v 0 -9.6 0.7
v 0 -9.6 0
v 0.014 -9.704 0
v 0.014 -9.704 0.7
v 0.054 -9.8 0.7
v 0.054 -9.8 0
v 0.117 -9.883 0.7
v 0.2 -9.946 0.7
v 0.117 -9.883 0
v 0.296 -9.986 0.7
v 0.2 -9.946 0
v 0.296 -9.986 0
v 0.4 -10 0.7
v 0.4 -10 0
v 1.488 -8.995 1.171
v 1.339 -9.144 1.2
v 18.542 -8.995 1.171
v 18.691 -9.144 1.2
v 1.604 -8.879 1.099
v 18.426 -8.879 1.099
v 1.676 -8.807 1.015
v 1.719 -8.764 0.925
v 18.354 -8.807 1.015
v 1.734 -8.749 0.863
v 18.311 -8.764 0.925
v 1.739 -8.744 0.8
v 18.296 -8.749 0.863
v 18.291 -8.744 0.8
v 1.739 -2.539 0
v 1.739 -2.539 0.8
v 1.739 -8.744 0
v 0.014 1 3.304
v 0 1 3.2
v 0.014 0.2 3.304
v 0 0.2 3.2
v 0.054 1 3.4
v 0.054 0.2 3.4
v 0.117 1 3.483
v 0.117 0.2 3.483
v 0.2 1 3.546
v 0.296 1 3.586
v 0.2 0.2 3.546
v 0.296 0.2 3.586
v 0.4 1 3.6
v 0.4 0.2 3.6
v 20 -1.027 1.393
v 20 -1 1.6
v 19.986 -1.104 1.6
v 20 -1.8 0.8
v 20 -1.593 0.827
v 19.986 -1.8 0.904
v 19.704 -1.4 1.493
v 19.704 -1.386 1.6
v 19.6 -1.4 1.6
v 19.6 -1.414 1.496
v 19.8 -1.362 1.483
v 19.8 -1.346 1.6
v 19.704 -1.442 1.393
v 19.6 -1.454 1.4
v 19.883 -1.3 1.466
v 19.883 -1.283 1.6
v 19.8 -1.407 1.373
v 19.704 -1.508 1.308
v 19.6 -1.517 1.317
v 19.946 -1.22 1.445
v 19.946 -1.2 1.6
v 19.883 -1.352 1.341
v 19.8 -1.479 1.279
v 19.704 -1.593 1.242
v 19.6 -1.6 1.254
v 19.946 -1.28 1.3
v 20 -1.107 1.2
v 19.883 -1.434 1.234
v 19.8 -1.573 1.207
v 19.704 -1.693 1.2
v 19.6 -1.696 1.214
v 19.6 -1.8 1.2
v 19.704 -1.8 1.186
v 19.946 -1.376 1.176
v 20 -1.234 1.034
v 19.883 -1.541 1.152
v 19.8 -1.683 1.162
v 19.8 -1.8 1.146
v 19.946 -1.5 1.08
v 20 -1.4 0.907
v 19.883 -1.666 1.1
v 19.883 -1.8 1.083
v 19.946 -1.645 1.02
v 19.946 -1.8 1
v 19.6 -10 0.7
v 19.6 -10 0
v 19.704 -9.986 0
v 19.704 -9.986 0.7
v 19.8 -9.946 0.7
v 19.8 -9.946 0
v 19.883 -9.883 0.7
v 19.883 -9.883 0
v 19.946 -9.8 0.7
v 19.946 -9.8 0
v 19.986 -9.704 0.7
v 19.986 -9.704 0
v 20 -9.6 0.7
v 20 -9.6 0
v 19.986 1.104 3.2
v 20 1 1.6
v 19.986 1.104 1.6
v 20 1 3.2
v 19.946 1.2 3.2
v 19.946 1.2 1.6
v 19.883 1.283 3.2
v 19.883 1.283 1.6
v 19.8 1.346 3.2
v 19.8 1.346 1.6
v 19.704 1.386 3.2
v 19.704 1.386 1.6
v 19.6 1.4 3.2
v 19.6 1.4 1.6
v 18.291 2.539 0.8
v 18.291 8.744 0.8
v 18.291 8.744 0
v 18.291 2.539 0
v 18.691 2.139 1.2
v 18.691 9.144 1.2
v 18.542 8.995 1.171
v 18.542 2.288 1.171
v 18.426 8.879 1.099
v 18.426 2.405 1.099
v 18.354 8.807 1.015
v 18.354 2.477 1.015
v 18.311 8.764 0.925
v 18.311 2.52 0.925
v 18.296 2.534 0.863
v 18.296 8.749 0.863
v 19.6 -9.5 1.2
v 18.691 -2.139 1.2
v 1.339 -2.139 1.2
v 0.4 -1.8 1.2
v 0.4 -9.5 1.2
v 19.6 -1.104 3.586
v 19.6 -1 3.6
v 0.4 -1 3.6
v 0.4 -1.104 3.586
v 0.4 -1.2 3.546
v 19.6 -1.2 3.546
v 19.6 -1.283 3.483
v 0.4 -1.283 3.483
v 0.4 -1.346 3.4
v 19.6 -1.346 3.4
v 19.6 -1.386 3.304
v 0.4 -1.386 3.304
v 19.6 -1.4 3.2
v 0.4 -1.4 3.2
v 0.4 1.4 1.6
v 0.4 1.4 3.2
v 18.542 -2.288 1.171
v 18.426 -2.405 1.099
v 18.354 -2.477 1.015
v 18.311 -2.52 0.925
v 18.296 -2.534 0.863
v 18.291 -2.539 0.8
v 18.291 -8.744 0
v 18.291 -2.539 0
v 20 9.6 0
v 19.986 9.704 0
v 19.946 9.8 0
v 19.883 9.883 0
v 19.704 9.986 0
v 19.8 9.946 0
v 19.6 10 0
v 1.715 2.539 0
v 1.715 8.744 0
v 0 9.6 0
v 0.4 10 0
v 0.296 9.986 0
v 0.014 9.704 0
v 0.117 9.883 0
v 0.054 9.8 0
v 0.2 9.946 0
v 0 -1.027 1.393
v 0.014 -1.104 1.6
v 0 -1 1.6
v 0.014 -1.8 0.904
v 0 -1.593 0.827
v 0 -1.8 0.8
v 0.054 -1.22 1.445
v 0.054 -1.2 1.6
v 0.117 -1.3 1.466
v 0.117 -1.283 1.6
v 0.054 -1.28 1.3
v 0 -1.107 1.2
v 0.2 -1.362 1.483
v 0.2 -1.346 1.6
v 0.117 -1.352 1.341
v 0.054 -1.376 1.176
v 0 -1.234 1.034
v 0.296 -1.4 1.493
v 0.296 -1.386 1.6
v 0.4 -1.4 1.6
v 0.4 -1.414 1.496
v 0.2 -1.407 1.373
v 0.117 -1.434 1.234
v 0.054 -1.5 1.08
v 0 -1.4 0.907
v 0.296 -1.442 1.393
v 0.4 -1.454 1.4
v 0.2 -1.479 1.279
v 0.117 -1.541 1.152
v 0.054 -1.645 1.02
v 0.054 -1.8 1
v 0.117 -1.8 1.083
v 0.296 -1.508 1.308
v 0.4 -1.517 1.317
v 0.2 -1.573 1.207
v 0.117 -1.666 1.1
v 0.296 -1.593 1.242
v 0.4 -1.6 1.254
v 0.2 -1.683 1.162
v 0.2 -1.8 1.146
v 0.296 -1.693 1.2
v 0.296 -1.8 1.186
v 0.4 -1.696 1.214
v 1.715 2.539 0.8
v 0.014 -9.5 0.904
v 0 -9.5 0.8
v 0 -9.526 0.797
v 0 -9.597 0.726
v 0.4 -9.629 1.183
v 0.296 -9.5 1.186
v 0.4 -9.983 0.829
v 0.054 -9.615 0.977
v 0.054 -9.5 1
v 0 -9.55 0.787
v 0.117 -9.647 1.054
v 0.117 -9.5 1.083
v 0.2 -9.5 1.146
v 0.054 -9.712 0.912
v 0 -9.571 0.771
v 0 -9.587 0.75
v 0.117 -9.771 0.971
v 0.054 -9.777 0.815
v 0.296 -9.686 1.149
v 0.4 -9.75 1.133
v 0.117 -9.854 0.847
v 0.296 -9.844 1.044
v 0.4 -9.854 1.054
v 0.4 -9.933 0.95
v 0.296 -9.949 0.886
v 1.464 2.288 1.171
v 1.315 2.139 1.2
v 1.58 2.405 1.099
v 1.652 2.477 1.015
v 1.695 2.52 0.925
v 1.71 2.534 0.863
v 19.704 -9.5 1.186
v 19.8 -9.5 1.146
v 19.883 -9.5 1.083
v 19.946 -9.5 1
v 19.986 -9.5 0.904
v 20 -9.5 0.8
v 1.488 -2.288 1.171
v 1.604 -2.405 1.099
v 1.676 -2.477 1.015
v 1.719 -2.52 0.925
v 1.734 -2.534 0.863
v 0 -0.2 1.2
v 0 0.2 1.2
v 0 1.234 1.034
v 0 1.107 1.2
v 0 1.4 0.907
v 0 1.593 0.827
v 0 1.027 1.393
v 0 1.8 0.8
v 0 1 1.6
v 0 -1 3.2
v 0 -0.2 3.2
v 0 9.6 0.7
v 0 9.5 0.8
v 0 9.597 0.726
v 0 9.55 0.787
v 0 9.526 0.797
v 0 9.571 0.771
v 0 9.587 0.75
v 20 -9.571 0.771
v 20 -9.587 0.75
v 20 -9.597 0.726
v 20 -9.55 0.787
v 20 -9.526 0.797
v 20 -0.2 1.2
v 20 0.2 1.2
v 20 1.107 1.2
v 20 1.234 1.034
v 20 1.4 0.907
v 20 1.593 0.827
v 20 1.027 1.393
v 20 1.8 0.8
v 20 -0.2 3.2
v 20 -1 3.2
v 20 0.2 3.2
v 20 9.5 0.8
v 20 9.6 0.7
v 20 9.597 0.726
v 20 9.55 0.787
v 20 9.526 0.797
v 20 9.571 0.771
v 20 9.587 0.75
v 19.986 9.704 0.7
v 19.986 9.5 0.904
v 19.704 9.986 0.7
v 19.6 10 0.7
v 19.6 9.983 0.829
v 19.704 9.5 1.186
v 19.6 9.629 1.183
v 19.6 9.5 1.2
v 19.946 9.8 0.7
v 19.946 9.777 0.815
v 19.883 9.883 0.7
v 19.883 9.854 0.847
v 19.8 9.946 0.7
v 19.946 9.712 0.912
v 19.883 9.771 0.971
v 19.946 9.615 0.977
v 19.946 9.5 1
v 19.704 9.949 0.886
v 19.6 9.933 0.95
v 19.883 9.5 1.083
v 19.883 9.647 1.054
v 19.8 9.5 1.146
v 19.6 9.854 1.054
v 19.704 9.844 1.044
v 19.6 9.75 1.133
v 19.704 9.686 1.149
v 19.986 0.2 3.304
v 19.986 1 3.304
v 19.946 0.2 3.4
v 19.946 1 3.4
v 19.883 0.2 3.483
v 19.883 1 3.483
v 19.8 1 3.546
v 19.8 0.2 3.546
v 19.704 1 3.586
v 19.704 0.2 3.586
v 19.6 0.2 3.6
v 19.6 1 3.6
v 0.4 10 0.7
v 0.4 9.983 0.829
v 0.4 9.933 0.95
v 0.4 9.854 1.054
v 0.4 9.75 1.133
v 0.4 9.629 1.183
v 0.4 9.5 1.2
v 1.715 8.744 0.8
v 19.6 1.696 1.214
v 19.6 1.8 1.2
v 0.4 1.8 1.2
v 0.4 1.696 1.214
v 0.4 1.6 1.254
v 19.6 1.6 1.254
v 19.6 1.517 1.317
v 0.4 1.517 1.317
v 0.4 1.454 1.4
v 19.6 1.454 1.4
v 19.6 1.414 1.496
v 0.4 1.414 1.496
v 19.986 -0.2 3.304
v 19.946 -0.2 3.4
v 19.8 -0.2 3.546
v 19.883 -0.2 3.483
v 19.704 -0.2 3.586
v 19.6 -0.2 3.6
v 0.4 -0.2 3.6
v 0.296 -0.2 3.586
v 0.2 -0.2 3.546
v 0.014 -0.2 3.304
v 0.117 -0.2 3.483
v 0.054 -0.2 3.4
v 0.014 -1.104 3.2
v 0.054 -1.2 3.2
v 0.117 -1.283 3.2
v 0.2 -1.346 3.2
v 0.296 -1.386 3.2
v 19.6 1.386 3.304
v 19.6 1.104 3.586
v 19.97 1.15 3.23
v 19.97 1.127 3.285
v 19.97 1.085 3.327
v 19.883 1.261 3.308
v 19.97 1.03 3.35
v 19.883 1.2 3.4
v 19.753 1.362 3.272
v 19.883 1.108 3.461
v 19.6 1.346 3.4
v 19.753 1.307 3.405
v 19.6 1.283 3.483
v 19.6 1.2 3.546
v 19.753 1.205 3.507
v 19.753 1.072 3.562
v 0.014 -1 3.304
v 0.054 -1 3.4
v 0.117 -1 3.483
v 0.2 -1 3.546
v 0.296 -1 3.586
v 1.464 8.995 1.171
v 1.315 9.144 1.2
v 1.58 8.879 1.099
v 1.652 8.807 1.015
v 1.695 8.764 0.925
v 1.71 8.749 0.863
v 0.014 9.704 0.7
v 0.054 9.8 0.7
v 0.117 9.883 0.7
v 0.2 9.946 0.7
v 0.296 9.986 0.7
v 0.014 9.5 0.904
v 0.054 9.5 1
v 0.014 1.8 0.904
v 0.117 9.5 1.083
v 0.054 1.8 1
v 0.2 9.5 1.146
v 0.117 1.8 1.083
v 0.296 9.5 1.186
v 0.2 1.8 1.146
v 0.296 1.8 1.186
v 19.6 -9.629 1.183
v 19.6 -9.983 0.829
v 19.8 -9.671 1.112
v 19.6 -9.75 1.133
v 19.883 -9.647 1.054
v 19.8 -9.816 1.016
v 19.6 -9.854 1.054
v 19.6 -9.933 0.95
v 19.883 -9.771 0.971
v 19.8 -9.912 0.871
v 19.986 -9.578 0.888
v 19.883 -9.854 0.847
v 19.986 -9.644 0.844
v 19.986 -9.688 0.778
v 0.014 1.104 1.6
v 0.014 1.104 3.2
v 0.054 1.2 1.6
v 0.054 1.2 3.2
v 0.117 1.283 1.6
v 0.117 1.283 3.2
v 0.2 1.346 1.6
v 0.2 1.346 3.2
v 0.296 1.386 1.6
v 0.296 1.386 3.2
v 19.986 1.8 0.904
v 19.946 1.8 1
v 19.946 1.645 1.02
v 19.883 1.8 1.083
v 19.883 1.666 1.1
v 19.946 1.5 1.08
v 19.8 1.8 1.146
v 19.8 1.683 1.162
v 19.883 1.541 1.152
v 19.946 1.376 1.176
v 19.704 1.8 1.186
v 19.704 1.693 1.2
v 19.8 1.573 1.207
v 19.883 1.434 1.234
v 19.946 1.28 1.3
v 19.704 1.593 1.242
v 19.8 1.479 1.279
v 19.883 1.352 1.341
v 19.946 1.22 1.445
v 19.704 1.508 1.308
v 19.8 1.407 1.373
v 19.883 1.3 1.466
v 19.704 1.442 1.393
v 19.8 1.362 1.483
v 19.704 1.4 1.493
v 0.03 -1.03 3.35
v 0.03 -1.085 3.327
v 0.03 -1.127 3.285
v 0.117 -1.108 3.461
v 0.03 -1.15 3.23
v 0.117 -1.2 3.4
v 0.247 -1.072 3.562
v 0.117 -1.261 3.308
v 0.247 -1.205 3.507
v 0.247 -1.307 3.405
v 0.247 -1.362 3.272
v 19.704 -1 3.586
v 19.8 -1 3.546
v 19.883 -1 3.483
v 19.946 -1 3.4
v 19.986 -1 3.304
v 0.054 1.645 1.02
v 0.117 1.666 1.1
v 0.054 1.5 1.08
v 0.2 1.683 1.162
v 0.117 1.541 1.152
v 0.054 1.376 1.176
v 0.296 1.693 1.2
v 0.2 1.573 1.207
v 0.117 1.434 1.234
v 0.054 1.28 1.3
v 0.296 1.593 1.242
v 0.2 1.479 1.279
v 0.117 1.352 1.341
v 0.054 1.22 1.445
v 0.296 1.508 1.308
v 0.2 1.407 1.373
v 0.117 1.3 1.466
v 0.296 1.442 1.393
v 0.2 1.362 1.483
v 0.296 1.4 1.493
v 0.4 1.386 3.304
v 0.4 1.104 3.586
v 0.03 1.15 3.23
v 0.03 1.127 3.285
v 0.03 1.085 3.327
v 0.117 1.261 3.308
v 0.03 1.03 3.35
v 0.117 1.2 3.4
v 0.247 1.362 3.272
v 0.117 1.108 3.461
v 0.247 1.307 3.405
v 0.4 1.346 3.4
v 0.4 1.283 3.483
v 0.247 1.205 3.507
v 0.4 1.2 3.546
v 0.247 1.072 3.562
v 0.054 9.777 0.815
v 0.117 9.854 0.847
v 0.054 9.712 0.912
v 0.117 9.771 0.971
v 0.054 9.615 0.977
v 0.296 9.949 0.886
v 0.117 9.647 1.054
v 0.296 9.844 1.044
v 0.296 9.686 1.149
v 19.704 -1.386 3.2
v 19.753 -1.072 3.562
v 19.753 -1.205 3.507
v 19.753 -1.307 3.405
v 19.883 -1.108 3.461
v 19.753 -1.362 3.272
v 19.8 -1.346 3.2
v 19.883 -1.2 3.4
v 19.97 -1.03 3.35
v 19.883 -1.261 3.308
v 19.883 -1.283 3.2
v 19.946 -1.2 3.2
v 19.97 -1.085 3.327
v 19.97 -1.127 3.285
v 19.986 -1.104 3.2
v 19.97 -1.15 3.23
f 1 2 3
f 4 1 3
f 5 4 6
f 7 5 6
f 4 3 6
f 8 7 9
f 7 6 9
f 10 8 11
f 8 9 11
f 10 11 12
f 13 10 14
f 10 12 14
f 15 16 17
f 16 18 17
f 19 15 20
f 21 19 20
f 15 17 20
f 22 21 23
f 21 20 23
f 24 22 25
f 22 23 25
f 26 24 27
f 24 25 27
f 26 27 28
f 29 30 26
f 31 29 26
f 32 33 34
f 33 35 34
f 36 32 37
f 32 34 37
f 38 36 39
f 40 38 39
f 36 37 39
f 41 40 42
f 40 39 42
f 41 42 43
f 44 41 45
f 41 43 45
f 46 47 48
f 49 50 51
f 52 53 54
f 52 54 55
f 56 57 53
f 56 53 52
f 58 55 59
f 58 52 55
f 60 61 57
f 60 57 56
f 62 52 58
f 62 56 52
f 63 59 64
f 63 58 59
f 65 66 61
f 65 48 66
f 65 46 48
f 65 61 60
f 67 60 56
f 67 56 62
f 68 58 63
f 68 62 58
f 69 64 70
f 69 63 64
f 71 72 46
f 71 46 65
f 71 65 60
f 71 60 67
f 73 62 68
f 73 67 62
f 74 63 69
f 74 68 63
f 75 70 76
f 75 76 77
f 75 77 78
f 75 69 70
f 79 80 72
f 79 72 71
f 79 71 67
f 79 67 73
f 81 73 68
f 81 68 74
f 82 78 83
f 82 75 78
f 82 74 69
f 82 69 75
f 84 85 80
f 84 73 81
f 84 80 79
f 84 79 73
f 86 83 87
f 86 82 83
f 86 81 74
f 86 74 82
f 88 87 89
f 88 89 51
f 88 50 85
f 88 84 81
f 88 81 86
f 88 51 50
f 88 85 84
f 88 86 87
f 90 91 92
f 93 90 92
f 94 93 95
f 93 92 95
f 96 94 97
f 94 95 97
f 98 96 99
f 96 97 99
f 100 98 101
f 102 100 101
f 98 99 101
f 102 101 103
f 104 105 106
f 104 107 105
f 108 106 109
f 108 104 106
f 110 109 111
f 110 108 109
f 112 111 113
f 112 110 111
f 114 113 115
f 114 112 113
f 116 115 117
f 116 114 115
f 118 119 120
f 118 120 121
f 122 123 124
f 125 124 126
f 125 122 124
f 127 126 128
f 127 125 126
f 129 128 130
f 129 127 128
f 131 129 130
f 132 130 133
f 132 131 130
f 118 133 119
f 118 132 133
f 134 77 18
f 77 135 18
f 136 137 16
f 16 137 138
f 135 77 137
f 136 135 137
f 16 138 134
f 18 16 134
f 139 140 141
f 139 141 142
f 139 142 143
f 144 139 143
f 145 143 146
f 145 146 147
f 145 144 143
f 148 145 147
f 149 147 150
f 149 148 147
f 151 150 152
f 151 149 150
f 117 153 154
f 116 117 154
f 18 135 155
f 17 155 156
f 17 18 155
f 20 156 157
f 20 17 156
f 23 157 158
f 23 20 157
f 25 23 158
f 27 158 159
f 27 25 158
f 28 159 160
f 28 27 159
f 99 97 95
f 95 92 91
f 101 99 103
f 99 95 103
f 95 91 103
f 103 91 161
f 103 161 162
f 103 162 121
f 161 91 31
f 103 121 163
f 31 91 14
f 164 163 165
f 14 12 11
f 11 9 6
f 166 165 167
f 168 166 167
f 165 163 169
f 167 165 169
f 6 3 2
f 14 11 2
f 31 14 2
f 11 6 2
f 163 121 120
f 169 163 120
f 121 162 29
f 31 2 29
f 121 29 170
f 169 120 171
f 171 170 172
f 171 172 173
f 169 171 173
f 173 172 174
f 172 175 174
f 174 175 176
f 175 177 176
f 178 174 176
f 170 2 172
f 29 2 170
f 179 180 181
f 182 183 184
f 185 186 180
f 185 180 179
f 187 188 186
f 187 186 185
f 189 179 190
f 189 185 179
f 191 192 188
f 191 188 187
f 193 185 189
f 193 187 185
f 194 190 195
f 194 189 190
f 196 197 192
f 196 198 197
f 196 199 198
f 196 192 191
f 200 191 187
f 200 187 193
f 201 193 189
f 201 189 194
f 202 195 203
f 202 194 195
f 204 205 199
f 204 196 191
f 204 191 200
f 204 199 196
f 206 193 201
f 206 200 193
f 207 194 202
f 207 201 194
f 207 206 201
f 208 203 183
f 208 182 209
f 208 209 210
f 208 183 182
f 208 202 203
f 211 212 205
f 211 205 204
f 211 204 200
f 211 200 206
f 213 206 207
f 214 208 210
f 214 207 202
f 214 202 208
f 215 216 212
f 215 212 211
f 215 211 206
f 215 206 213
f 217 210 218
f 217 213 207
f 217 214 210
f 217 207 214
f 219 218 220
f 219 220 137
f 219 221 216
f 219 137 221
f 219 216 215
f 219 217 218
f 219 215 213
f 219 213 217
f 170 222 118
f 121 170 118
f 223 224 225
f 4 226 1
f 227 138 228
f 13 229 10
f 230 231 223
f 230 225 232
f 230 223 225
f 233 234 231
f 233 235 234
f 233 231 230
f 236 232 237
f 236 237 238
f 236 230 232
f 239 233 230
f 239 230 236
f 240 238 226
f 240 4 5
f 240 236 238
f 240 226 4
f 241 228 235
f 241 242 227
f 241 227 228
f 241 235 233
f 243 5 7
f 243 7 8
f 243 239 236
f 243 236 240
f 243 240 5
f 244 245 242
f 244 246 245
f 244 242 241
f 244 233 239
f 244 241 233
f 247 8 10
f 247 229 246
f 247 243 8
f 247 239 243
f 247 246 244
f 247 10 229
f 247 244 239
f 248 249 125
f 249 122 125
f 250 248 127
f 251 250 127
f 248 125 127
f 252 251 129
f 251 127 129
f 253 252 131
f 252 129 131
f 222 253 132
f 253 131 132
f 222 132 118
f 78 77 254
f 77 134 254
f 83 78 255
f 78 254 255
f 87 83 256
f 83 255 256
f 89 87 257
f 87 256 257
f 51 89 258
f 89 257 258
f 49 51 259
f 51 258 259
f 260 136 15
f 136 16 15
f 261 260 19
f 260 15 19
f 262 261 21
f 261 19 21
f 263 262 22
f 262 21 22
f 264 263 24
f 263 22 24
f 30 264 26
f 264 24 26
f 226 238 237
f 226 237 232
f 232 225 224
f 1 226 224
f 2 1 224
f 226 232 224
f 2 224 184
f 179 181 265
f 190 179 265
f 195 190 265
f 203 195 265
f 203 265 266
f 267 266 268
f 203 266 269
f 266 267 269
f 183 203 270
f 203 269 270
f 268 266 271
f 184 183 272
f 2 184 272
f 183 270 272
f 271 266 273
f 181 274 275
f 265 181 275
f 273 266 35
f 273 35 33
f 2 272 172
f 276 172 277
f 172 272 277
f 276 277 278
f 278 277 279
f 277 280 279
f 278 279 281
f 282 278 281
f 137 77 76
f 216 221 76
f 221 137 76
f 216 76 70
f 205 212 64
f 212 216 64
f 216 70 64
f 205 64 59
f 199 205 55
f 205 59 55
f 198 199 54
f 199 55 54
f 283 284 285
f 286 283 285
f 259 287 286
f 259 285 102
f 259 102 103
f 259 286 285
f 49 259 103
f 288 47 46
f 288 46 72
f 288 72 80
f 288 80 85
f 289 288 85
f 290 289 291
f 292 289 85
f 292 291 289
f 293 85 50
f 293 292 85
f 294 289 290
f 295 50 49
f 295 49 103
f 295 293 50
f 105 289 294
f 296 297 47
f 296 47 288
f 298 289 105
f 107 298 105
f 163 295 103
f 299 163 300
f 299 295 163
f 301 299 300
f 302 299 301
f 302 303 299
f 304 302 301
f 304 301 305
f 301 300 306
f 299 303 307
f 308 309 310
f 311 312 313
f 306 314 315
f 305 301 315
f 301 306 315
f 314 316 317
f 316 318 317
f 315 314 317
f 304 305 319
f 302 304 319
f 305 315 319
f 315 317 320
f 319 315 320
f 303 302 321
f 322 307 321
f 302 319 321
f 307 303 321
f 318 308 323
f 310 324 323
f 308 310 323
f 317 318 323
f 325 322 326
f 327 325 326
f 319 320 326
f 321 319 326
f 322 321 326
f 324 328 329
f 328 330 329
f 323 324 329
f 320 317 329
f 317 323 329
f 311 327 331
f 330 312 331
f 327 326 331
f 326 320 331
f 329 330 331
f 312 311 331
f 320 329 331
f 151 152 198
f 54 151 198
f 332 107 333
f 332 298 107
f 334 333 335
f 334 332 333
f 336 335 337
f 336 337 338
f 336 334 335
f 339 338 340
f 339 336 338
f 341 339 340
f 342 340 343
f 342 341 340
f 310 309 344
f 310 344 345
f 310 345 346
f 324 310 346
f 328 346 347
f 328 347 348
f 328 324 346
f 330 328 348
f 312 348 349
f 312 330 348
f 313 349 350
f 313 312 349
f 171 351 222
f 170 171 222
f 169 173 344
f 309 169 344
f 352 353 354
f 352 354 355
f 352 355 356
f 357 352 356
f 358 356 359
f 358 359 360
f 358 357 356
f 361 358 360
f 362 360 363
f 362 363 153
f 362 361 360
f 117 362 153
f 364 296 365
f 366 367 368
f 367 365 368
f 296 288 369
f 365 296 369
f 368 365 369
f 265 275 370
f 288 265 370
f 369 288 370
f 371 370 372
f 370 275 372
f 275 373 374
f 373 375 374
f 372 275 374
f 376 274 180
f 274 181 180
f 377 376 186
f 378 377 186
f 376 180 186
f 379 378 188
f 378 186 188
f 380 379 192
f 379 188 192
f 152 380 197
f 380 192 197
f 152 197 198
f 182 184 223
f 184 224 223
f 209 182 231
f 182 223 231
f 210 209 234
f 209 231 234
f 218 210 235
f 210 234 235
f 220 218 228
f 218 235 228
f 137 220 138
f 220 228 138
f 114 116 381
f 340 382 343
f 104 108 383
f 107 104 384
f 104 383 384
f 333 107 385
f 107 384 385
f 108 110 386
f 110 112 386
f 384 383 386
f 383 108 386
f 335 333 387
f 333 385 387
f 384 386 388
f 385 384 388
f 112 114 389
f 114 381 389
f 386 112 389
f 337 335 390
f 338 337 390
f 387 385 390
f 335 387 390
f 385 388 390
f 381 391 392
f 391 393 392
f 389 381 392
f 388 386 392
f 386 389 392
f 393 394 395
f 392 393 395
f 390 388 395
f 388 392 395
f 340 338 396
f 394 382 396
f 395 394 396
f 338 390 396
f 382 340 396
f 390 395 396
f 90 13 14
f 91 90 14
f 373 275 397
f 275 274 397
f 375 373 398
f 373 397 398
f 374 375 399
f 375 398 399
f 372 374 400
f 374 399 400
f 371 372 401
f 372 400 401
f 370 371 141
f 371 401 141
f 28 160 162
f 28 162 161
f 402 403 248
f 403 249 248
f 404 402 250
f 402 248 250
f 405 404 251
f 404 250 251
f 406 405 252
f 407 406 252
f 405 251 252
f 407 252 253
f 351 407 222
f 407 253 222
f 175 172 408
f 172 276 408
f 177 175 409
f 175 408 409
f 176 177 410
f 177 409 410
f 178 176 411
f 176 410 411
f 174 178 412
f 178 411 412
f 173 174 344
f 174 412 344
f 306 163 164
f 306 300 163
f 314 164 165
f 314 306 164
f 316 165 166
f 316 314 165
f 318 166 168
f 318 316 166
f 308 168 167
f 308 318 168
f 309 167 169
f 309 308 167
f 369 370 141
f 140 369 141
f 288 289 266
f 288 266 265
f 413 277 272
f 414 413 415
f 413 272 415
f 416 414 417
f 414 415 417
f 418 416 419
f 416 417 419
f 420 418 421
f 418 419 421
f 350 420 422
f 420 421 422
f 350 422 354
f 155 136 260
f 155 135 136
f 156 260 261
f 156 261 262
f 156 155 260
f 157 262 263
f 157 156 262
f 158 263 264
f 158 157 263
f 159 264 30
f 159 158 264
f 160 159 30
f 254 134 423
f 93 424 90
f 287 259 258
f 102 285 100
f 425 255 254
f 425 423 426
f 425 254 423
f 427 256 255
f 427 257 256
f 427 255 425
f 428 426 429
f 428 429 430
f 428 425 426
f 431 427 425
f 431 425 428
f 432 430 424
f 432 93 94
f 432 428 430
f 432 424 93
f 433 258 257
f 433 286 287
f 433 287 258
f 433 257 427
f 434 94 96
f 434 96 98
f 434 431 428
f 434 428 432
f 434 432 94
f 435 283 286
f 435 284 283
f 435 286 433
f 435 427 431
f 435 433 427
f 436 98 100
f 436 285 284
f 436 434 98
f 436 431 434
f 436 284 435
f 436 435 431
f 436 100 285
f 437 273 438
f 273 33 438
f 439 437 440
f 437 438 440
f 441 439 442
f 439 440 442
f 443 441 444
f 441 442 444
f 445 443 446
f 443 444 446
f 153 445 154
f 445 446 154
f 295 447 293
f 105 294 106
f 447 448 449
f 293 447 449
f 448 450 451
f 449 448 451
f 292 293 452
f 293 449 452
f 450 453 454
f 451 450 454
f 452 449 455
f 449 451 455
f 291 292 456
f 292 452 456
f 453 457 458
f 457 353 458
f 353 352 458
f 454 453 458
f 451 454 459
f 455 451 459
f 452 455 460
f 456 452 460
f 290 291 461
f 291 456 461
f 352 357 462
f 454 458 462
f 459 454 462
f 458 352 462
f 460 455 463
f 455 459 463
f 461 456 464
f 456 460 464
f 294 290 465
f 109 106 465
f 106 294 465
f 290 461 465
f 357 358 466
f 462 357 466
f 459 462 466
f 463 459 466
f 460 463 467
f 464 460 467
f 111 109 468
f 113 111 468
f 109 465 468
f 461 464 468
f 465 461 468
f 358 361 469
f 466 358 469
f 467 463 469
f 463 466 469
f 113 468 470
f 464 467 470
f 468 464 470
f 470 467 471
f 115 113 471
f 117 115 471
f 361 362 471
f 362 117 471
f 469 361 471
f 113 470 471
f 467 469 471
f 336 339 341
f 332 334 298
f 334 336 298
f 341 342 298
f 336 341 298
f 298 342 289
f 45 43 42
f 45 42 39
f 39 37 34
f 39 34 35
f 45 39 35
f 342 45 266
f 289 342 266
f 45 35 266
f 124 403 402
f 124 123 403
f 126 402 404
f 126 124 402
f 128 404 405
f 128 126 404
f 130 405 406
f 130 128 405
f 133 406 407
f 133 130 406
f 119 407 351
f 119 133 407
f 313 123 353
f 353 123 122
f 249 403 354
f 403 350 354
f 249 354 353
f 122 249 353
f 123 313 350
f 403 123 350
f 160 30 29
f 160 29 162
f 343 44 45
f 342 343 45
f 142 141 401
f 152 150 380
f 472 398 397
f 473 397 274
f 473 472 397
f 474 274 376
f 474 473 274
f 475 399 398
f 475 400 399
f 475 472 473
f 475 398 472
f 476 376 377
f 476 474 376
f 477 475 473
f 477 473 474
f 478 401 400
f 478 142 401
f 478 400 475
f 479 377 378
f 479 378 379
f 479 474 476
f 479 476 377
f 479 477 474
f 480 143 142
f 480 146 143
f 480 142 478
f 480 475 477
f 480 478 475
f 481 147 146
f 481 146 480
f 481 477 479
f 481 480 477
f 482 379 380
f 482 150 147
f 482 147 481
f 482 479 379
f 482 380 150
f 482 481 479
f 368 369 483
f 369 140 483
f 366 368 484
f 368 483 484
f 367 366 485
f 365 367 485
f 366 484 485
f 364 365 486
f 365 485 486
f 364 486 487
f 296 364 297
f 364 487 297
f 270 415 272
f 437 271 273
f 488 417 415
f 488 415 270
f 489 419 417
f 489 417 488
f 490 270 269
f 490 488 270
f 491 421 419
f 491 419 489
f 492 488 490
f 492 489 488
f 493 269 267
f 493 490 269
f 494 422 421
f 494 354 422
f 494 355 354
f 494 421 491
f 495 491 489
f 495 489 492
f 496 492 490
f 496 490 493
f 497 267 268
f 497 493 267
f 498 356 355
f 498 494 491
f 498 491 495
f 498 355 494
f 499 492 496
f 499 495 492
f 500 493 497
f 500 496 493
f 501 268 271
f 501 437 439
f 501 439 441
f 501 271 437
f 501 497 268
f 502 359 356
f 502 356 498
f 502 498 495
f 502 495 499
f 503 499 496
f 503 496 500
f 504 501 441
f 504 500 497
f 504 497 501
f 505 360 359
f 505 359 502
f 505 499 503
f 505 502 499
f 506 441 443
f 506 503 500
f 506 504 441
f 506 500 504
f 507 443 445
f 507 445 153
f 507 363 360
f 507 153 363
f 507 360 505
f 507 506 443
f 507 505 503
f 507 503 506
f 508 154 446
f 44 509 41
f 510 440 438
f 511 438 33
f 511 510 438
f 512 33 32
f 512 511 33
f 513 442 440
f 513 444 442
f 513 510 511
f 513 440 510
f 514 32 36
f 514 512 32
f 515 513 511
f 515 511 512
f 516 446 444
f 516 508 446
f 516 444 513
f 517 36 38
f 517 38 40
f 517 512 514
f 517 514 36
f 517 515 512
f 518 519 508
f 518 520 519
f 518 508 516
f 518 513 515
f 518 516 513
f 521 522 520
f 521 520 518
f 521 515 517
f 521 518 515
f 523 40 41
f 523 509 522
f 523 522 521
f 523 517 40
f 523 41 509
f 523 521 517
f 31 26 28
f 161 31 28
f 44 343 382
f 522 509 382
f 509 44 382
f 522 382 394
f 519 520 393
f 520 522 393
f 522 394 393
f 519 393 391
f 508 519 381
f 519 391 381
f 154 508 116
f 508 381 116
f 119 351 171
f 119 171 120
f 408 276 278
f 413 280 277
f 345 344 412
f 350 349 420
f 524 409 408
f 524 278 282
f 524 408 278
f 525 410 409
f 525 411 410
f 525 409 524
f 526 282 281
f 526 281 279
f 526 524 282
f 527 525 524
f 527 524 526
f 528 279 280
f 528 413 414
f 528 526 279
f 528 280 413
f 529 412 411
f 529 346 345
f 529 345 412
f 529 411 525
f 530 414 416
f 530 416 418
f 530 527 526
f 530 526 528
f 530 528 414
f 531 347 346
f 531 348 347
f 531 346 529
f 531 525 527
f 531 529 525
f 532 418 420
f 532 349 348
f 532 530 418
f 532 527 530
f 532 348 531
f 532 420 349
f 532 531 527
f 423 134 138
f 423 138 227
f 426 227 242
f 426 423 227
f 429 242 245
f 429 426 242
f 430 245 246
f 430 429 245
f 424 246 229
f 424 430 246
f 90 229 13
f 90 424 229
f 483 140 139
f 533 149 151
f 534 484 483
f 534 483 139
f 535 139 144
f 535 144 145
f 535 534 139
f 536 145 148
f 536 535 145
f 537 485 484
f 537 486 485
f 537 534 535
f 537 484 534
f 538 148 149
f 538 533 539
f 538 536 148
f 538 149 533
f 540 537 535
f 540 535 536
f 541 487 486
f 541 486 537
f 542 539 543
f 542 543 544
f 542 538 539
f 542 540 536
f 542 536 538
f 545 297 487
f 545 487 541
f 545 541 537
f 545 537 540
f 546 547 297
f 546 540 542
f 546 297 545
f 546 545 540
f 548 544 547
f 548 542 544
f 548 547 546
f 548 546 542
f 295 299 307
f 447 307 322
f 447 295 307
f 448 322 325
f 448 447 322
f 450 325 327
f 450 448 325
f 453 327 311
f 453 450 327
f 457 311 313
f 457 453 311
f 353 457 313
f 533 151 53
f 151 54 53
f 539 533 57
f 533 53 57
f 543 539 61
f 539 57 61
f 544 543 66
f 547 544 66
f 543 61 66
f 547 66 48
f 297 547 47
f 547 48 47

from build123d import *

# Parameters (mm, degrees)
PAD_DEPTH       = 20
FILLET_R        = 0.5
FILLET001_R     = 0.5
FILLET002_R     = 0.4
FILLET003_R     = 0.4
SKETCH002_W     = 6.171573
SKETCH002_H     = 16.569204
POCKET_DEPTH    = 23
SKETCH003_W     = 6.204978
SKETCH003_H     = 16.552317
SKETCH003_H_2   = 16.575784
POCKET001_DEPTH = 23
FILLET004_R     = 0.4
FILLET005_R     = 0.4
FILLET006_R     = 0.4
FILLET007_R     = 0.4
FILLET008_R     = 0.4
FILLET009_R     = 0.4
FILLET010_R     = 0.4
FILLET011_R     = 0.4


with BuildPart() as part:
    # Sketch → Pad (new body)
    with BuildSketch(Plane.YZ):
        Polygon((-9.999999, 0), (10.000001, 0), (10.000001, 1.2), (1.4, 1.2), (1.4, 3.6), (0.2, 3.6), (0.2, 1.2), (-0.2, 1.2), (-0.2, 3.6), (-1.4, 3.6), (-1.4, 1.2), (-10.000001, 1.2), align=None)
    extrude(amount=PAD_DEPTH)

    # Fillet
    fillet_edges = [part.edges().sort_by_distance(p)[0] for p in [
        (10, -10.000001, 1.2),
    ]]
    fillet(fillet_edges, radius=FILLET_R)

    # Fillet001
    fillet001_edges = [part.edges().sort_by_distance(p)[0] for p in [
        (10, 10.000001, 1.2),
    ]]
    fillet(fillet001_edges, radius=FILLET001_R)

    # Fillet002
    fillet002_edges = [part.edges().sort_by_distance(p)[0] for p in [
        (10, -1.4, 1.2),
    ]]
    fillet(fillet002_edges, radius=FILLET002_R)

    # Fillet003
    fillet003_edges = [part.edges().sort_by_distance(p)[0] for p in [
        (10, 1.4, 1.2),
    ]]
    fillet(fillet003_edges, radius=FILLET003_R)

    # Sketch002 → Pocket (cut)
    with BuildSketch(Plane(origin=(0, 0, 1.2), x_dir=(0, -1, 0), z_dir=(0, 0, 1))):
        with Locations((-5.631366, 10)):
            Rectangle(SKETCH002_W, SKETCH002_H)
    extrude(amount=-POCKET_DEPTH, mode=Mode.SUBTRACT)

    # Sketch003 → Pocket001 (cut)
    with BuildSketch(Plane(origin=(0, 0, 1.2), x_dir=(0, -1, 0), z_dir=(0, 0, 1))):
        with Locations((5.641938, 10.014704)):
            Rectangle(SKETCH003_W, SKETCH003_H)
        with Locations((-5.641938, 10.002971)):
            Rectangle(SKETCH003_W, SKETCH003_H_2)
    extrude(amount=-POCKET001_DEPTH, mode=Mode.SUBTRACT)

    # Fillet004
    fillet004_edges = [part.edges().sort_by_distance(p)[0] for p in [
        (1.738546, -5.641938, 1.2),
        (10.014704, -2.539449, 1.2),
        (10.014705, -8.744427, 1.2),
        (18.290863, -5.641938, 1.2),
    ]]
    fillet(fillet004_edges, radius=FILLET004_R)

    # Fillet005
    fillet005_edges = [part.edges().sort_by_distance(p)[0] for p in [
        (10.002971, 8.744427, 1.2),
        (1.715079, 5.641938, 1.2),
        (10.002971, 2.539449, 1.2),
        (18.290863, 5.641938, 1.2),
    ]]
    fillet(fillet005_edges, radius=FILLET005_R)

    # Fillet006
    fillet006_edges = [part.edges().sort_by_distance(p)[0] for p in [
        (10, -1.4, 3.6),
    ]]
    fillet(fillet006_edges, radius=FILLET006_R)

    # Fillet007
    fillet007_edges = [part.edges().sort_by_distance(p)[0] for p in [
        (10, 1.4, 3.6),
    ]]
    fillet(fillet007_edges, radius=FILLET007_R)

    # Fillet008
    fillet008_edges = [part.edges().sort_by_distance(p)[0] for p in [
        (20, -0.6, 3.6),
    ]]
    fillet(fillet008_edges, radius=FILLET008_R)

    # Fillet009
    fillet009_edges = [part.edges().sort_by_distance(p)[0] for p in [
        (20, 0.6, 3.6),
    ]]
    fillet(fillet009_edges, radius=FILLET009_R)

    # Fillet010
    fillet010_edges = [part.edges().sort_by_distance(p)[0] for p in [
        (0, -0.6, 3.6),
    ]]
    fillet(fillet010_edges, radius=FILLET010_R)

    # Fillet011
    fillet011_edges = [part.edges().sort_by_distance(p)[0] for p in [
        (0, 0.6, 3.6),
    ]]
    fillet(fillet011_edges, radius=FILLET011_R)


solid = part.part
